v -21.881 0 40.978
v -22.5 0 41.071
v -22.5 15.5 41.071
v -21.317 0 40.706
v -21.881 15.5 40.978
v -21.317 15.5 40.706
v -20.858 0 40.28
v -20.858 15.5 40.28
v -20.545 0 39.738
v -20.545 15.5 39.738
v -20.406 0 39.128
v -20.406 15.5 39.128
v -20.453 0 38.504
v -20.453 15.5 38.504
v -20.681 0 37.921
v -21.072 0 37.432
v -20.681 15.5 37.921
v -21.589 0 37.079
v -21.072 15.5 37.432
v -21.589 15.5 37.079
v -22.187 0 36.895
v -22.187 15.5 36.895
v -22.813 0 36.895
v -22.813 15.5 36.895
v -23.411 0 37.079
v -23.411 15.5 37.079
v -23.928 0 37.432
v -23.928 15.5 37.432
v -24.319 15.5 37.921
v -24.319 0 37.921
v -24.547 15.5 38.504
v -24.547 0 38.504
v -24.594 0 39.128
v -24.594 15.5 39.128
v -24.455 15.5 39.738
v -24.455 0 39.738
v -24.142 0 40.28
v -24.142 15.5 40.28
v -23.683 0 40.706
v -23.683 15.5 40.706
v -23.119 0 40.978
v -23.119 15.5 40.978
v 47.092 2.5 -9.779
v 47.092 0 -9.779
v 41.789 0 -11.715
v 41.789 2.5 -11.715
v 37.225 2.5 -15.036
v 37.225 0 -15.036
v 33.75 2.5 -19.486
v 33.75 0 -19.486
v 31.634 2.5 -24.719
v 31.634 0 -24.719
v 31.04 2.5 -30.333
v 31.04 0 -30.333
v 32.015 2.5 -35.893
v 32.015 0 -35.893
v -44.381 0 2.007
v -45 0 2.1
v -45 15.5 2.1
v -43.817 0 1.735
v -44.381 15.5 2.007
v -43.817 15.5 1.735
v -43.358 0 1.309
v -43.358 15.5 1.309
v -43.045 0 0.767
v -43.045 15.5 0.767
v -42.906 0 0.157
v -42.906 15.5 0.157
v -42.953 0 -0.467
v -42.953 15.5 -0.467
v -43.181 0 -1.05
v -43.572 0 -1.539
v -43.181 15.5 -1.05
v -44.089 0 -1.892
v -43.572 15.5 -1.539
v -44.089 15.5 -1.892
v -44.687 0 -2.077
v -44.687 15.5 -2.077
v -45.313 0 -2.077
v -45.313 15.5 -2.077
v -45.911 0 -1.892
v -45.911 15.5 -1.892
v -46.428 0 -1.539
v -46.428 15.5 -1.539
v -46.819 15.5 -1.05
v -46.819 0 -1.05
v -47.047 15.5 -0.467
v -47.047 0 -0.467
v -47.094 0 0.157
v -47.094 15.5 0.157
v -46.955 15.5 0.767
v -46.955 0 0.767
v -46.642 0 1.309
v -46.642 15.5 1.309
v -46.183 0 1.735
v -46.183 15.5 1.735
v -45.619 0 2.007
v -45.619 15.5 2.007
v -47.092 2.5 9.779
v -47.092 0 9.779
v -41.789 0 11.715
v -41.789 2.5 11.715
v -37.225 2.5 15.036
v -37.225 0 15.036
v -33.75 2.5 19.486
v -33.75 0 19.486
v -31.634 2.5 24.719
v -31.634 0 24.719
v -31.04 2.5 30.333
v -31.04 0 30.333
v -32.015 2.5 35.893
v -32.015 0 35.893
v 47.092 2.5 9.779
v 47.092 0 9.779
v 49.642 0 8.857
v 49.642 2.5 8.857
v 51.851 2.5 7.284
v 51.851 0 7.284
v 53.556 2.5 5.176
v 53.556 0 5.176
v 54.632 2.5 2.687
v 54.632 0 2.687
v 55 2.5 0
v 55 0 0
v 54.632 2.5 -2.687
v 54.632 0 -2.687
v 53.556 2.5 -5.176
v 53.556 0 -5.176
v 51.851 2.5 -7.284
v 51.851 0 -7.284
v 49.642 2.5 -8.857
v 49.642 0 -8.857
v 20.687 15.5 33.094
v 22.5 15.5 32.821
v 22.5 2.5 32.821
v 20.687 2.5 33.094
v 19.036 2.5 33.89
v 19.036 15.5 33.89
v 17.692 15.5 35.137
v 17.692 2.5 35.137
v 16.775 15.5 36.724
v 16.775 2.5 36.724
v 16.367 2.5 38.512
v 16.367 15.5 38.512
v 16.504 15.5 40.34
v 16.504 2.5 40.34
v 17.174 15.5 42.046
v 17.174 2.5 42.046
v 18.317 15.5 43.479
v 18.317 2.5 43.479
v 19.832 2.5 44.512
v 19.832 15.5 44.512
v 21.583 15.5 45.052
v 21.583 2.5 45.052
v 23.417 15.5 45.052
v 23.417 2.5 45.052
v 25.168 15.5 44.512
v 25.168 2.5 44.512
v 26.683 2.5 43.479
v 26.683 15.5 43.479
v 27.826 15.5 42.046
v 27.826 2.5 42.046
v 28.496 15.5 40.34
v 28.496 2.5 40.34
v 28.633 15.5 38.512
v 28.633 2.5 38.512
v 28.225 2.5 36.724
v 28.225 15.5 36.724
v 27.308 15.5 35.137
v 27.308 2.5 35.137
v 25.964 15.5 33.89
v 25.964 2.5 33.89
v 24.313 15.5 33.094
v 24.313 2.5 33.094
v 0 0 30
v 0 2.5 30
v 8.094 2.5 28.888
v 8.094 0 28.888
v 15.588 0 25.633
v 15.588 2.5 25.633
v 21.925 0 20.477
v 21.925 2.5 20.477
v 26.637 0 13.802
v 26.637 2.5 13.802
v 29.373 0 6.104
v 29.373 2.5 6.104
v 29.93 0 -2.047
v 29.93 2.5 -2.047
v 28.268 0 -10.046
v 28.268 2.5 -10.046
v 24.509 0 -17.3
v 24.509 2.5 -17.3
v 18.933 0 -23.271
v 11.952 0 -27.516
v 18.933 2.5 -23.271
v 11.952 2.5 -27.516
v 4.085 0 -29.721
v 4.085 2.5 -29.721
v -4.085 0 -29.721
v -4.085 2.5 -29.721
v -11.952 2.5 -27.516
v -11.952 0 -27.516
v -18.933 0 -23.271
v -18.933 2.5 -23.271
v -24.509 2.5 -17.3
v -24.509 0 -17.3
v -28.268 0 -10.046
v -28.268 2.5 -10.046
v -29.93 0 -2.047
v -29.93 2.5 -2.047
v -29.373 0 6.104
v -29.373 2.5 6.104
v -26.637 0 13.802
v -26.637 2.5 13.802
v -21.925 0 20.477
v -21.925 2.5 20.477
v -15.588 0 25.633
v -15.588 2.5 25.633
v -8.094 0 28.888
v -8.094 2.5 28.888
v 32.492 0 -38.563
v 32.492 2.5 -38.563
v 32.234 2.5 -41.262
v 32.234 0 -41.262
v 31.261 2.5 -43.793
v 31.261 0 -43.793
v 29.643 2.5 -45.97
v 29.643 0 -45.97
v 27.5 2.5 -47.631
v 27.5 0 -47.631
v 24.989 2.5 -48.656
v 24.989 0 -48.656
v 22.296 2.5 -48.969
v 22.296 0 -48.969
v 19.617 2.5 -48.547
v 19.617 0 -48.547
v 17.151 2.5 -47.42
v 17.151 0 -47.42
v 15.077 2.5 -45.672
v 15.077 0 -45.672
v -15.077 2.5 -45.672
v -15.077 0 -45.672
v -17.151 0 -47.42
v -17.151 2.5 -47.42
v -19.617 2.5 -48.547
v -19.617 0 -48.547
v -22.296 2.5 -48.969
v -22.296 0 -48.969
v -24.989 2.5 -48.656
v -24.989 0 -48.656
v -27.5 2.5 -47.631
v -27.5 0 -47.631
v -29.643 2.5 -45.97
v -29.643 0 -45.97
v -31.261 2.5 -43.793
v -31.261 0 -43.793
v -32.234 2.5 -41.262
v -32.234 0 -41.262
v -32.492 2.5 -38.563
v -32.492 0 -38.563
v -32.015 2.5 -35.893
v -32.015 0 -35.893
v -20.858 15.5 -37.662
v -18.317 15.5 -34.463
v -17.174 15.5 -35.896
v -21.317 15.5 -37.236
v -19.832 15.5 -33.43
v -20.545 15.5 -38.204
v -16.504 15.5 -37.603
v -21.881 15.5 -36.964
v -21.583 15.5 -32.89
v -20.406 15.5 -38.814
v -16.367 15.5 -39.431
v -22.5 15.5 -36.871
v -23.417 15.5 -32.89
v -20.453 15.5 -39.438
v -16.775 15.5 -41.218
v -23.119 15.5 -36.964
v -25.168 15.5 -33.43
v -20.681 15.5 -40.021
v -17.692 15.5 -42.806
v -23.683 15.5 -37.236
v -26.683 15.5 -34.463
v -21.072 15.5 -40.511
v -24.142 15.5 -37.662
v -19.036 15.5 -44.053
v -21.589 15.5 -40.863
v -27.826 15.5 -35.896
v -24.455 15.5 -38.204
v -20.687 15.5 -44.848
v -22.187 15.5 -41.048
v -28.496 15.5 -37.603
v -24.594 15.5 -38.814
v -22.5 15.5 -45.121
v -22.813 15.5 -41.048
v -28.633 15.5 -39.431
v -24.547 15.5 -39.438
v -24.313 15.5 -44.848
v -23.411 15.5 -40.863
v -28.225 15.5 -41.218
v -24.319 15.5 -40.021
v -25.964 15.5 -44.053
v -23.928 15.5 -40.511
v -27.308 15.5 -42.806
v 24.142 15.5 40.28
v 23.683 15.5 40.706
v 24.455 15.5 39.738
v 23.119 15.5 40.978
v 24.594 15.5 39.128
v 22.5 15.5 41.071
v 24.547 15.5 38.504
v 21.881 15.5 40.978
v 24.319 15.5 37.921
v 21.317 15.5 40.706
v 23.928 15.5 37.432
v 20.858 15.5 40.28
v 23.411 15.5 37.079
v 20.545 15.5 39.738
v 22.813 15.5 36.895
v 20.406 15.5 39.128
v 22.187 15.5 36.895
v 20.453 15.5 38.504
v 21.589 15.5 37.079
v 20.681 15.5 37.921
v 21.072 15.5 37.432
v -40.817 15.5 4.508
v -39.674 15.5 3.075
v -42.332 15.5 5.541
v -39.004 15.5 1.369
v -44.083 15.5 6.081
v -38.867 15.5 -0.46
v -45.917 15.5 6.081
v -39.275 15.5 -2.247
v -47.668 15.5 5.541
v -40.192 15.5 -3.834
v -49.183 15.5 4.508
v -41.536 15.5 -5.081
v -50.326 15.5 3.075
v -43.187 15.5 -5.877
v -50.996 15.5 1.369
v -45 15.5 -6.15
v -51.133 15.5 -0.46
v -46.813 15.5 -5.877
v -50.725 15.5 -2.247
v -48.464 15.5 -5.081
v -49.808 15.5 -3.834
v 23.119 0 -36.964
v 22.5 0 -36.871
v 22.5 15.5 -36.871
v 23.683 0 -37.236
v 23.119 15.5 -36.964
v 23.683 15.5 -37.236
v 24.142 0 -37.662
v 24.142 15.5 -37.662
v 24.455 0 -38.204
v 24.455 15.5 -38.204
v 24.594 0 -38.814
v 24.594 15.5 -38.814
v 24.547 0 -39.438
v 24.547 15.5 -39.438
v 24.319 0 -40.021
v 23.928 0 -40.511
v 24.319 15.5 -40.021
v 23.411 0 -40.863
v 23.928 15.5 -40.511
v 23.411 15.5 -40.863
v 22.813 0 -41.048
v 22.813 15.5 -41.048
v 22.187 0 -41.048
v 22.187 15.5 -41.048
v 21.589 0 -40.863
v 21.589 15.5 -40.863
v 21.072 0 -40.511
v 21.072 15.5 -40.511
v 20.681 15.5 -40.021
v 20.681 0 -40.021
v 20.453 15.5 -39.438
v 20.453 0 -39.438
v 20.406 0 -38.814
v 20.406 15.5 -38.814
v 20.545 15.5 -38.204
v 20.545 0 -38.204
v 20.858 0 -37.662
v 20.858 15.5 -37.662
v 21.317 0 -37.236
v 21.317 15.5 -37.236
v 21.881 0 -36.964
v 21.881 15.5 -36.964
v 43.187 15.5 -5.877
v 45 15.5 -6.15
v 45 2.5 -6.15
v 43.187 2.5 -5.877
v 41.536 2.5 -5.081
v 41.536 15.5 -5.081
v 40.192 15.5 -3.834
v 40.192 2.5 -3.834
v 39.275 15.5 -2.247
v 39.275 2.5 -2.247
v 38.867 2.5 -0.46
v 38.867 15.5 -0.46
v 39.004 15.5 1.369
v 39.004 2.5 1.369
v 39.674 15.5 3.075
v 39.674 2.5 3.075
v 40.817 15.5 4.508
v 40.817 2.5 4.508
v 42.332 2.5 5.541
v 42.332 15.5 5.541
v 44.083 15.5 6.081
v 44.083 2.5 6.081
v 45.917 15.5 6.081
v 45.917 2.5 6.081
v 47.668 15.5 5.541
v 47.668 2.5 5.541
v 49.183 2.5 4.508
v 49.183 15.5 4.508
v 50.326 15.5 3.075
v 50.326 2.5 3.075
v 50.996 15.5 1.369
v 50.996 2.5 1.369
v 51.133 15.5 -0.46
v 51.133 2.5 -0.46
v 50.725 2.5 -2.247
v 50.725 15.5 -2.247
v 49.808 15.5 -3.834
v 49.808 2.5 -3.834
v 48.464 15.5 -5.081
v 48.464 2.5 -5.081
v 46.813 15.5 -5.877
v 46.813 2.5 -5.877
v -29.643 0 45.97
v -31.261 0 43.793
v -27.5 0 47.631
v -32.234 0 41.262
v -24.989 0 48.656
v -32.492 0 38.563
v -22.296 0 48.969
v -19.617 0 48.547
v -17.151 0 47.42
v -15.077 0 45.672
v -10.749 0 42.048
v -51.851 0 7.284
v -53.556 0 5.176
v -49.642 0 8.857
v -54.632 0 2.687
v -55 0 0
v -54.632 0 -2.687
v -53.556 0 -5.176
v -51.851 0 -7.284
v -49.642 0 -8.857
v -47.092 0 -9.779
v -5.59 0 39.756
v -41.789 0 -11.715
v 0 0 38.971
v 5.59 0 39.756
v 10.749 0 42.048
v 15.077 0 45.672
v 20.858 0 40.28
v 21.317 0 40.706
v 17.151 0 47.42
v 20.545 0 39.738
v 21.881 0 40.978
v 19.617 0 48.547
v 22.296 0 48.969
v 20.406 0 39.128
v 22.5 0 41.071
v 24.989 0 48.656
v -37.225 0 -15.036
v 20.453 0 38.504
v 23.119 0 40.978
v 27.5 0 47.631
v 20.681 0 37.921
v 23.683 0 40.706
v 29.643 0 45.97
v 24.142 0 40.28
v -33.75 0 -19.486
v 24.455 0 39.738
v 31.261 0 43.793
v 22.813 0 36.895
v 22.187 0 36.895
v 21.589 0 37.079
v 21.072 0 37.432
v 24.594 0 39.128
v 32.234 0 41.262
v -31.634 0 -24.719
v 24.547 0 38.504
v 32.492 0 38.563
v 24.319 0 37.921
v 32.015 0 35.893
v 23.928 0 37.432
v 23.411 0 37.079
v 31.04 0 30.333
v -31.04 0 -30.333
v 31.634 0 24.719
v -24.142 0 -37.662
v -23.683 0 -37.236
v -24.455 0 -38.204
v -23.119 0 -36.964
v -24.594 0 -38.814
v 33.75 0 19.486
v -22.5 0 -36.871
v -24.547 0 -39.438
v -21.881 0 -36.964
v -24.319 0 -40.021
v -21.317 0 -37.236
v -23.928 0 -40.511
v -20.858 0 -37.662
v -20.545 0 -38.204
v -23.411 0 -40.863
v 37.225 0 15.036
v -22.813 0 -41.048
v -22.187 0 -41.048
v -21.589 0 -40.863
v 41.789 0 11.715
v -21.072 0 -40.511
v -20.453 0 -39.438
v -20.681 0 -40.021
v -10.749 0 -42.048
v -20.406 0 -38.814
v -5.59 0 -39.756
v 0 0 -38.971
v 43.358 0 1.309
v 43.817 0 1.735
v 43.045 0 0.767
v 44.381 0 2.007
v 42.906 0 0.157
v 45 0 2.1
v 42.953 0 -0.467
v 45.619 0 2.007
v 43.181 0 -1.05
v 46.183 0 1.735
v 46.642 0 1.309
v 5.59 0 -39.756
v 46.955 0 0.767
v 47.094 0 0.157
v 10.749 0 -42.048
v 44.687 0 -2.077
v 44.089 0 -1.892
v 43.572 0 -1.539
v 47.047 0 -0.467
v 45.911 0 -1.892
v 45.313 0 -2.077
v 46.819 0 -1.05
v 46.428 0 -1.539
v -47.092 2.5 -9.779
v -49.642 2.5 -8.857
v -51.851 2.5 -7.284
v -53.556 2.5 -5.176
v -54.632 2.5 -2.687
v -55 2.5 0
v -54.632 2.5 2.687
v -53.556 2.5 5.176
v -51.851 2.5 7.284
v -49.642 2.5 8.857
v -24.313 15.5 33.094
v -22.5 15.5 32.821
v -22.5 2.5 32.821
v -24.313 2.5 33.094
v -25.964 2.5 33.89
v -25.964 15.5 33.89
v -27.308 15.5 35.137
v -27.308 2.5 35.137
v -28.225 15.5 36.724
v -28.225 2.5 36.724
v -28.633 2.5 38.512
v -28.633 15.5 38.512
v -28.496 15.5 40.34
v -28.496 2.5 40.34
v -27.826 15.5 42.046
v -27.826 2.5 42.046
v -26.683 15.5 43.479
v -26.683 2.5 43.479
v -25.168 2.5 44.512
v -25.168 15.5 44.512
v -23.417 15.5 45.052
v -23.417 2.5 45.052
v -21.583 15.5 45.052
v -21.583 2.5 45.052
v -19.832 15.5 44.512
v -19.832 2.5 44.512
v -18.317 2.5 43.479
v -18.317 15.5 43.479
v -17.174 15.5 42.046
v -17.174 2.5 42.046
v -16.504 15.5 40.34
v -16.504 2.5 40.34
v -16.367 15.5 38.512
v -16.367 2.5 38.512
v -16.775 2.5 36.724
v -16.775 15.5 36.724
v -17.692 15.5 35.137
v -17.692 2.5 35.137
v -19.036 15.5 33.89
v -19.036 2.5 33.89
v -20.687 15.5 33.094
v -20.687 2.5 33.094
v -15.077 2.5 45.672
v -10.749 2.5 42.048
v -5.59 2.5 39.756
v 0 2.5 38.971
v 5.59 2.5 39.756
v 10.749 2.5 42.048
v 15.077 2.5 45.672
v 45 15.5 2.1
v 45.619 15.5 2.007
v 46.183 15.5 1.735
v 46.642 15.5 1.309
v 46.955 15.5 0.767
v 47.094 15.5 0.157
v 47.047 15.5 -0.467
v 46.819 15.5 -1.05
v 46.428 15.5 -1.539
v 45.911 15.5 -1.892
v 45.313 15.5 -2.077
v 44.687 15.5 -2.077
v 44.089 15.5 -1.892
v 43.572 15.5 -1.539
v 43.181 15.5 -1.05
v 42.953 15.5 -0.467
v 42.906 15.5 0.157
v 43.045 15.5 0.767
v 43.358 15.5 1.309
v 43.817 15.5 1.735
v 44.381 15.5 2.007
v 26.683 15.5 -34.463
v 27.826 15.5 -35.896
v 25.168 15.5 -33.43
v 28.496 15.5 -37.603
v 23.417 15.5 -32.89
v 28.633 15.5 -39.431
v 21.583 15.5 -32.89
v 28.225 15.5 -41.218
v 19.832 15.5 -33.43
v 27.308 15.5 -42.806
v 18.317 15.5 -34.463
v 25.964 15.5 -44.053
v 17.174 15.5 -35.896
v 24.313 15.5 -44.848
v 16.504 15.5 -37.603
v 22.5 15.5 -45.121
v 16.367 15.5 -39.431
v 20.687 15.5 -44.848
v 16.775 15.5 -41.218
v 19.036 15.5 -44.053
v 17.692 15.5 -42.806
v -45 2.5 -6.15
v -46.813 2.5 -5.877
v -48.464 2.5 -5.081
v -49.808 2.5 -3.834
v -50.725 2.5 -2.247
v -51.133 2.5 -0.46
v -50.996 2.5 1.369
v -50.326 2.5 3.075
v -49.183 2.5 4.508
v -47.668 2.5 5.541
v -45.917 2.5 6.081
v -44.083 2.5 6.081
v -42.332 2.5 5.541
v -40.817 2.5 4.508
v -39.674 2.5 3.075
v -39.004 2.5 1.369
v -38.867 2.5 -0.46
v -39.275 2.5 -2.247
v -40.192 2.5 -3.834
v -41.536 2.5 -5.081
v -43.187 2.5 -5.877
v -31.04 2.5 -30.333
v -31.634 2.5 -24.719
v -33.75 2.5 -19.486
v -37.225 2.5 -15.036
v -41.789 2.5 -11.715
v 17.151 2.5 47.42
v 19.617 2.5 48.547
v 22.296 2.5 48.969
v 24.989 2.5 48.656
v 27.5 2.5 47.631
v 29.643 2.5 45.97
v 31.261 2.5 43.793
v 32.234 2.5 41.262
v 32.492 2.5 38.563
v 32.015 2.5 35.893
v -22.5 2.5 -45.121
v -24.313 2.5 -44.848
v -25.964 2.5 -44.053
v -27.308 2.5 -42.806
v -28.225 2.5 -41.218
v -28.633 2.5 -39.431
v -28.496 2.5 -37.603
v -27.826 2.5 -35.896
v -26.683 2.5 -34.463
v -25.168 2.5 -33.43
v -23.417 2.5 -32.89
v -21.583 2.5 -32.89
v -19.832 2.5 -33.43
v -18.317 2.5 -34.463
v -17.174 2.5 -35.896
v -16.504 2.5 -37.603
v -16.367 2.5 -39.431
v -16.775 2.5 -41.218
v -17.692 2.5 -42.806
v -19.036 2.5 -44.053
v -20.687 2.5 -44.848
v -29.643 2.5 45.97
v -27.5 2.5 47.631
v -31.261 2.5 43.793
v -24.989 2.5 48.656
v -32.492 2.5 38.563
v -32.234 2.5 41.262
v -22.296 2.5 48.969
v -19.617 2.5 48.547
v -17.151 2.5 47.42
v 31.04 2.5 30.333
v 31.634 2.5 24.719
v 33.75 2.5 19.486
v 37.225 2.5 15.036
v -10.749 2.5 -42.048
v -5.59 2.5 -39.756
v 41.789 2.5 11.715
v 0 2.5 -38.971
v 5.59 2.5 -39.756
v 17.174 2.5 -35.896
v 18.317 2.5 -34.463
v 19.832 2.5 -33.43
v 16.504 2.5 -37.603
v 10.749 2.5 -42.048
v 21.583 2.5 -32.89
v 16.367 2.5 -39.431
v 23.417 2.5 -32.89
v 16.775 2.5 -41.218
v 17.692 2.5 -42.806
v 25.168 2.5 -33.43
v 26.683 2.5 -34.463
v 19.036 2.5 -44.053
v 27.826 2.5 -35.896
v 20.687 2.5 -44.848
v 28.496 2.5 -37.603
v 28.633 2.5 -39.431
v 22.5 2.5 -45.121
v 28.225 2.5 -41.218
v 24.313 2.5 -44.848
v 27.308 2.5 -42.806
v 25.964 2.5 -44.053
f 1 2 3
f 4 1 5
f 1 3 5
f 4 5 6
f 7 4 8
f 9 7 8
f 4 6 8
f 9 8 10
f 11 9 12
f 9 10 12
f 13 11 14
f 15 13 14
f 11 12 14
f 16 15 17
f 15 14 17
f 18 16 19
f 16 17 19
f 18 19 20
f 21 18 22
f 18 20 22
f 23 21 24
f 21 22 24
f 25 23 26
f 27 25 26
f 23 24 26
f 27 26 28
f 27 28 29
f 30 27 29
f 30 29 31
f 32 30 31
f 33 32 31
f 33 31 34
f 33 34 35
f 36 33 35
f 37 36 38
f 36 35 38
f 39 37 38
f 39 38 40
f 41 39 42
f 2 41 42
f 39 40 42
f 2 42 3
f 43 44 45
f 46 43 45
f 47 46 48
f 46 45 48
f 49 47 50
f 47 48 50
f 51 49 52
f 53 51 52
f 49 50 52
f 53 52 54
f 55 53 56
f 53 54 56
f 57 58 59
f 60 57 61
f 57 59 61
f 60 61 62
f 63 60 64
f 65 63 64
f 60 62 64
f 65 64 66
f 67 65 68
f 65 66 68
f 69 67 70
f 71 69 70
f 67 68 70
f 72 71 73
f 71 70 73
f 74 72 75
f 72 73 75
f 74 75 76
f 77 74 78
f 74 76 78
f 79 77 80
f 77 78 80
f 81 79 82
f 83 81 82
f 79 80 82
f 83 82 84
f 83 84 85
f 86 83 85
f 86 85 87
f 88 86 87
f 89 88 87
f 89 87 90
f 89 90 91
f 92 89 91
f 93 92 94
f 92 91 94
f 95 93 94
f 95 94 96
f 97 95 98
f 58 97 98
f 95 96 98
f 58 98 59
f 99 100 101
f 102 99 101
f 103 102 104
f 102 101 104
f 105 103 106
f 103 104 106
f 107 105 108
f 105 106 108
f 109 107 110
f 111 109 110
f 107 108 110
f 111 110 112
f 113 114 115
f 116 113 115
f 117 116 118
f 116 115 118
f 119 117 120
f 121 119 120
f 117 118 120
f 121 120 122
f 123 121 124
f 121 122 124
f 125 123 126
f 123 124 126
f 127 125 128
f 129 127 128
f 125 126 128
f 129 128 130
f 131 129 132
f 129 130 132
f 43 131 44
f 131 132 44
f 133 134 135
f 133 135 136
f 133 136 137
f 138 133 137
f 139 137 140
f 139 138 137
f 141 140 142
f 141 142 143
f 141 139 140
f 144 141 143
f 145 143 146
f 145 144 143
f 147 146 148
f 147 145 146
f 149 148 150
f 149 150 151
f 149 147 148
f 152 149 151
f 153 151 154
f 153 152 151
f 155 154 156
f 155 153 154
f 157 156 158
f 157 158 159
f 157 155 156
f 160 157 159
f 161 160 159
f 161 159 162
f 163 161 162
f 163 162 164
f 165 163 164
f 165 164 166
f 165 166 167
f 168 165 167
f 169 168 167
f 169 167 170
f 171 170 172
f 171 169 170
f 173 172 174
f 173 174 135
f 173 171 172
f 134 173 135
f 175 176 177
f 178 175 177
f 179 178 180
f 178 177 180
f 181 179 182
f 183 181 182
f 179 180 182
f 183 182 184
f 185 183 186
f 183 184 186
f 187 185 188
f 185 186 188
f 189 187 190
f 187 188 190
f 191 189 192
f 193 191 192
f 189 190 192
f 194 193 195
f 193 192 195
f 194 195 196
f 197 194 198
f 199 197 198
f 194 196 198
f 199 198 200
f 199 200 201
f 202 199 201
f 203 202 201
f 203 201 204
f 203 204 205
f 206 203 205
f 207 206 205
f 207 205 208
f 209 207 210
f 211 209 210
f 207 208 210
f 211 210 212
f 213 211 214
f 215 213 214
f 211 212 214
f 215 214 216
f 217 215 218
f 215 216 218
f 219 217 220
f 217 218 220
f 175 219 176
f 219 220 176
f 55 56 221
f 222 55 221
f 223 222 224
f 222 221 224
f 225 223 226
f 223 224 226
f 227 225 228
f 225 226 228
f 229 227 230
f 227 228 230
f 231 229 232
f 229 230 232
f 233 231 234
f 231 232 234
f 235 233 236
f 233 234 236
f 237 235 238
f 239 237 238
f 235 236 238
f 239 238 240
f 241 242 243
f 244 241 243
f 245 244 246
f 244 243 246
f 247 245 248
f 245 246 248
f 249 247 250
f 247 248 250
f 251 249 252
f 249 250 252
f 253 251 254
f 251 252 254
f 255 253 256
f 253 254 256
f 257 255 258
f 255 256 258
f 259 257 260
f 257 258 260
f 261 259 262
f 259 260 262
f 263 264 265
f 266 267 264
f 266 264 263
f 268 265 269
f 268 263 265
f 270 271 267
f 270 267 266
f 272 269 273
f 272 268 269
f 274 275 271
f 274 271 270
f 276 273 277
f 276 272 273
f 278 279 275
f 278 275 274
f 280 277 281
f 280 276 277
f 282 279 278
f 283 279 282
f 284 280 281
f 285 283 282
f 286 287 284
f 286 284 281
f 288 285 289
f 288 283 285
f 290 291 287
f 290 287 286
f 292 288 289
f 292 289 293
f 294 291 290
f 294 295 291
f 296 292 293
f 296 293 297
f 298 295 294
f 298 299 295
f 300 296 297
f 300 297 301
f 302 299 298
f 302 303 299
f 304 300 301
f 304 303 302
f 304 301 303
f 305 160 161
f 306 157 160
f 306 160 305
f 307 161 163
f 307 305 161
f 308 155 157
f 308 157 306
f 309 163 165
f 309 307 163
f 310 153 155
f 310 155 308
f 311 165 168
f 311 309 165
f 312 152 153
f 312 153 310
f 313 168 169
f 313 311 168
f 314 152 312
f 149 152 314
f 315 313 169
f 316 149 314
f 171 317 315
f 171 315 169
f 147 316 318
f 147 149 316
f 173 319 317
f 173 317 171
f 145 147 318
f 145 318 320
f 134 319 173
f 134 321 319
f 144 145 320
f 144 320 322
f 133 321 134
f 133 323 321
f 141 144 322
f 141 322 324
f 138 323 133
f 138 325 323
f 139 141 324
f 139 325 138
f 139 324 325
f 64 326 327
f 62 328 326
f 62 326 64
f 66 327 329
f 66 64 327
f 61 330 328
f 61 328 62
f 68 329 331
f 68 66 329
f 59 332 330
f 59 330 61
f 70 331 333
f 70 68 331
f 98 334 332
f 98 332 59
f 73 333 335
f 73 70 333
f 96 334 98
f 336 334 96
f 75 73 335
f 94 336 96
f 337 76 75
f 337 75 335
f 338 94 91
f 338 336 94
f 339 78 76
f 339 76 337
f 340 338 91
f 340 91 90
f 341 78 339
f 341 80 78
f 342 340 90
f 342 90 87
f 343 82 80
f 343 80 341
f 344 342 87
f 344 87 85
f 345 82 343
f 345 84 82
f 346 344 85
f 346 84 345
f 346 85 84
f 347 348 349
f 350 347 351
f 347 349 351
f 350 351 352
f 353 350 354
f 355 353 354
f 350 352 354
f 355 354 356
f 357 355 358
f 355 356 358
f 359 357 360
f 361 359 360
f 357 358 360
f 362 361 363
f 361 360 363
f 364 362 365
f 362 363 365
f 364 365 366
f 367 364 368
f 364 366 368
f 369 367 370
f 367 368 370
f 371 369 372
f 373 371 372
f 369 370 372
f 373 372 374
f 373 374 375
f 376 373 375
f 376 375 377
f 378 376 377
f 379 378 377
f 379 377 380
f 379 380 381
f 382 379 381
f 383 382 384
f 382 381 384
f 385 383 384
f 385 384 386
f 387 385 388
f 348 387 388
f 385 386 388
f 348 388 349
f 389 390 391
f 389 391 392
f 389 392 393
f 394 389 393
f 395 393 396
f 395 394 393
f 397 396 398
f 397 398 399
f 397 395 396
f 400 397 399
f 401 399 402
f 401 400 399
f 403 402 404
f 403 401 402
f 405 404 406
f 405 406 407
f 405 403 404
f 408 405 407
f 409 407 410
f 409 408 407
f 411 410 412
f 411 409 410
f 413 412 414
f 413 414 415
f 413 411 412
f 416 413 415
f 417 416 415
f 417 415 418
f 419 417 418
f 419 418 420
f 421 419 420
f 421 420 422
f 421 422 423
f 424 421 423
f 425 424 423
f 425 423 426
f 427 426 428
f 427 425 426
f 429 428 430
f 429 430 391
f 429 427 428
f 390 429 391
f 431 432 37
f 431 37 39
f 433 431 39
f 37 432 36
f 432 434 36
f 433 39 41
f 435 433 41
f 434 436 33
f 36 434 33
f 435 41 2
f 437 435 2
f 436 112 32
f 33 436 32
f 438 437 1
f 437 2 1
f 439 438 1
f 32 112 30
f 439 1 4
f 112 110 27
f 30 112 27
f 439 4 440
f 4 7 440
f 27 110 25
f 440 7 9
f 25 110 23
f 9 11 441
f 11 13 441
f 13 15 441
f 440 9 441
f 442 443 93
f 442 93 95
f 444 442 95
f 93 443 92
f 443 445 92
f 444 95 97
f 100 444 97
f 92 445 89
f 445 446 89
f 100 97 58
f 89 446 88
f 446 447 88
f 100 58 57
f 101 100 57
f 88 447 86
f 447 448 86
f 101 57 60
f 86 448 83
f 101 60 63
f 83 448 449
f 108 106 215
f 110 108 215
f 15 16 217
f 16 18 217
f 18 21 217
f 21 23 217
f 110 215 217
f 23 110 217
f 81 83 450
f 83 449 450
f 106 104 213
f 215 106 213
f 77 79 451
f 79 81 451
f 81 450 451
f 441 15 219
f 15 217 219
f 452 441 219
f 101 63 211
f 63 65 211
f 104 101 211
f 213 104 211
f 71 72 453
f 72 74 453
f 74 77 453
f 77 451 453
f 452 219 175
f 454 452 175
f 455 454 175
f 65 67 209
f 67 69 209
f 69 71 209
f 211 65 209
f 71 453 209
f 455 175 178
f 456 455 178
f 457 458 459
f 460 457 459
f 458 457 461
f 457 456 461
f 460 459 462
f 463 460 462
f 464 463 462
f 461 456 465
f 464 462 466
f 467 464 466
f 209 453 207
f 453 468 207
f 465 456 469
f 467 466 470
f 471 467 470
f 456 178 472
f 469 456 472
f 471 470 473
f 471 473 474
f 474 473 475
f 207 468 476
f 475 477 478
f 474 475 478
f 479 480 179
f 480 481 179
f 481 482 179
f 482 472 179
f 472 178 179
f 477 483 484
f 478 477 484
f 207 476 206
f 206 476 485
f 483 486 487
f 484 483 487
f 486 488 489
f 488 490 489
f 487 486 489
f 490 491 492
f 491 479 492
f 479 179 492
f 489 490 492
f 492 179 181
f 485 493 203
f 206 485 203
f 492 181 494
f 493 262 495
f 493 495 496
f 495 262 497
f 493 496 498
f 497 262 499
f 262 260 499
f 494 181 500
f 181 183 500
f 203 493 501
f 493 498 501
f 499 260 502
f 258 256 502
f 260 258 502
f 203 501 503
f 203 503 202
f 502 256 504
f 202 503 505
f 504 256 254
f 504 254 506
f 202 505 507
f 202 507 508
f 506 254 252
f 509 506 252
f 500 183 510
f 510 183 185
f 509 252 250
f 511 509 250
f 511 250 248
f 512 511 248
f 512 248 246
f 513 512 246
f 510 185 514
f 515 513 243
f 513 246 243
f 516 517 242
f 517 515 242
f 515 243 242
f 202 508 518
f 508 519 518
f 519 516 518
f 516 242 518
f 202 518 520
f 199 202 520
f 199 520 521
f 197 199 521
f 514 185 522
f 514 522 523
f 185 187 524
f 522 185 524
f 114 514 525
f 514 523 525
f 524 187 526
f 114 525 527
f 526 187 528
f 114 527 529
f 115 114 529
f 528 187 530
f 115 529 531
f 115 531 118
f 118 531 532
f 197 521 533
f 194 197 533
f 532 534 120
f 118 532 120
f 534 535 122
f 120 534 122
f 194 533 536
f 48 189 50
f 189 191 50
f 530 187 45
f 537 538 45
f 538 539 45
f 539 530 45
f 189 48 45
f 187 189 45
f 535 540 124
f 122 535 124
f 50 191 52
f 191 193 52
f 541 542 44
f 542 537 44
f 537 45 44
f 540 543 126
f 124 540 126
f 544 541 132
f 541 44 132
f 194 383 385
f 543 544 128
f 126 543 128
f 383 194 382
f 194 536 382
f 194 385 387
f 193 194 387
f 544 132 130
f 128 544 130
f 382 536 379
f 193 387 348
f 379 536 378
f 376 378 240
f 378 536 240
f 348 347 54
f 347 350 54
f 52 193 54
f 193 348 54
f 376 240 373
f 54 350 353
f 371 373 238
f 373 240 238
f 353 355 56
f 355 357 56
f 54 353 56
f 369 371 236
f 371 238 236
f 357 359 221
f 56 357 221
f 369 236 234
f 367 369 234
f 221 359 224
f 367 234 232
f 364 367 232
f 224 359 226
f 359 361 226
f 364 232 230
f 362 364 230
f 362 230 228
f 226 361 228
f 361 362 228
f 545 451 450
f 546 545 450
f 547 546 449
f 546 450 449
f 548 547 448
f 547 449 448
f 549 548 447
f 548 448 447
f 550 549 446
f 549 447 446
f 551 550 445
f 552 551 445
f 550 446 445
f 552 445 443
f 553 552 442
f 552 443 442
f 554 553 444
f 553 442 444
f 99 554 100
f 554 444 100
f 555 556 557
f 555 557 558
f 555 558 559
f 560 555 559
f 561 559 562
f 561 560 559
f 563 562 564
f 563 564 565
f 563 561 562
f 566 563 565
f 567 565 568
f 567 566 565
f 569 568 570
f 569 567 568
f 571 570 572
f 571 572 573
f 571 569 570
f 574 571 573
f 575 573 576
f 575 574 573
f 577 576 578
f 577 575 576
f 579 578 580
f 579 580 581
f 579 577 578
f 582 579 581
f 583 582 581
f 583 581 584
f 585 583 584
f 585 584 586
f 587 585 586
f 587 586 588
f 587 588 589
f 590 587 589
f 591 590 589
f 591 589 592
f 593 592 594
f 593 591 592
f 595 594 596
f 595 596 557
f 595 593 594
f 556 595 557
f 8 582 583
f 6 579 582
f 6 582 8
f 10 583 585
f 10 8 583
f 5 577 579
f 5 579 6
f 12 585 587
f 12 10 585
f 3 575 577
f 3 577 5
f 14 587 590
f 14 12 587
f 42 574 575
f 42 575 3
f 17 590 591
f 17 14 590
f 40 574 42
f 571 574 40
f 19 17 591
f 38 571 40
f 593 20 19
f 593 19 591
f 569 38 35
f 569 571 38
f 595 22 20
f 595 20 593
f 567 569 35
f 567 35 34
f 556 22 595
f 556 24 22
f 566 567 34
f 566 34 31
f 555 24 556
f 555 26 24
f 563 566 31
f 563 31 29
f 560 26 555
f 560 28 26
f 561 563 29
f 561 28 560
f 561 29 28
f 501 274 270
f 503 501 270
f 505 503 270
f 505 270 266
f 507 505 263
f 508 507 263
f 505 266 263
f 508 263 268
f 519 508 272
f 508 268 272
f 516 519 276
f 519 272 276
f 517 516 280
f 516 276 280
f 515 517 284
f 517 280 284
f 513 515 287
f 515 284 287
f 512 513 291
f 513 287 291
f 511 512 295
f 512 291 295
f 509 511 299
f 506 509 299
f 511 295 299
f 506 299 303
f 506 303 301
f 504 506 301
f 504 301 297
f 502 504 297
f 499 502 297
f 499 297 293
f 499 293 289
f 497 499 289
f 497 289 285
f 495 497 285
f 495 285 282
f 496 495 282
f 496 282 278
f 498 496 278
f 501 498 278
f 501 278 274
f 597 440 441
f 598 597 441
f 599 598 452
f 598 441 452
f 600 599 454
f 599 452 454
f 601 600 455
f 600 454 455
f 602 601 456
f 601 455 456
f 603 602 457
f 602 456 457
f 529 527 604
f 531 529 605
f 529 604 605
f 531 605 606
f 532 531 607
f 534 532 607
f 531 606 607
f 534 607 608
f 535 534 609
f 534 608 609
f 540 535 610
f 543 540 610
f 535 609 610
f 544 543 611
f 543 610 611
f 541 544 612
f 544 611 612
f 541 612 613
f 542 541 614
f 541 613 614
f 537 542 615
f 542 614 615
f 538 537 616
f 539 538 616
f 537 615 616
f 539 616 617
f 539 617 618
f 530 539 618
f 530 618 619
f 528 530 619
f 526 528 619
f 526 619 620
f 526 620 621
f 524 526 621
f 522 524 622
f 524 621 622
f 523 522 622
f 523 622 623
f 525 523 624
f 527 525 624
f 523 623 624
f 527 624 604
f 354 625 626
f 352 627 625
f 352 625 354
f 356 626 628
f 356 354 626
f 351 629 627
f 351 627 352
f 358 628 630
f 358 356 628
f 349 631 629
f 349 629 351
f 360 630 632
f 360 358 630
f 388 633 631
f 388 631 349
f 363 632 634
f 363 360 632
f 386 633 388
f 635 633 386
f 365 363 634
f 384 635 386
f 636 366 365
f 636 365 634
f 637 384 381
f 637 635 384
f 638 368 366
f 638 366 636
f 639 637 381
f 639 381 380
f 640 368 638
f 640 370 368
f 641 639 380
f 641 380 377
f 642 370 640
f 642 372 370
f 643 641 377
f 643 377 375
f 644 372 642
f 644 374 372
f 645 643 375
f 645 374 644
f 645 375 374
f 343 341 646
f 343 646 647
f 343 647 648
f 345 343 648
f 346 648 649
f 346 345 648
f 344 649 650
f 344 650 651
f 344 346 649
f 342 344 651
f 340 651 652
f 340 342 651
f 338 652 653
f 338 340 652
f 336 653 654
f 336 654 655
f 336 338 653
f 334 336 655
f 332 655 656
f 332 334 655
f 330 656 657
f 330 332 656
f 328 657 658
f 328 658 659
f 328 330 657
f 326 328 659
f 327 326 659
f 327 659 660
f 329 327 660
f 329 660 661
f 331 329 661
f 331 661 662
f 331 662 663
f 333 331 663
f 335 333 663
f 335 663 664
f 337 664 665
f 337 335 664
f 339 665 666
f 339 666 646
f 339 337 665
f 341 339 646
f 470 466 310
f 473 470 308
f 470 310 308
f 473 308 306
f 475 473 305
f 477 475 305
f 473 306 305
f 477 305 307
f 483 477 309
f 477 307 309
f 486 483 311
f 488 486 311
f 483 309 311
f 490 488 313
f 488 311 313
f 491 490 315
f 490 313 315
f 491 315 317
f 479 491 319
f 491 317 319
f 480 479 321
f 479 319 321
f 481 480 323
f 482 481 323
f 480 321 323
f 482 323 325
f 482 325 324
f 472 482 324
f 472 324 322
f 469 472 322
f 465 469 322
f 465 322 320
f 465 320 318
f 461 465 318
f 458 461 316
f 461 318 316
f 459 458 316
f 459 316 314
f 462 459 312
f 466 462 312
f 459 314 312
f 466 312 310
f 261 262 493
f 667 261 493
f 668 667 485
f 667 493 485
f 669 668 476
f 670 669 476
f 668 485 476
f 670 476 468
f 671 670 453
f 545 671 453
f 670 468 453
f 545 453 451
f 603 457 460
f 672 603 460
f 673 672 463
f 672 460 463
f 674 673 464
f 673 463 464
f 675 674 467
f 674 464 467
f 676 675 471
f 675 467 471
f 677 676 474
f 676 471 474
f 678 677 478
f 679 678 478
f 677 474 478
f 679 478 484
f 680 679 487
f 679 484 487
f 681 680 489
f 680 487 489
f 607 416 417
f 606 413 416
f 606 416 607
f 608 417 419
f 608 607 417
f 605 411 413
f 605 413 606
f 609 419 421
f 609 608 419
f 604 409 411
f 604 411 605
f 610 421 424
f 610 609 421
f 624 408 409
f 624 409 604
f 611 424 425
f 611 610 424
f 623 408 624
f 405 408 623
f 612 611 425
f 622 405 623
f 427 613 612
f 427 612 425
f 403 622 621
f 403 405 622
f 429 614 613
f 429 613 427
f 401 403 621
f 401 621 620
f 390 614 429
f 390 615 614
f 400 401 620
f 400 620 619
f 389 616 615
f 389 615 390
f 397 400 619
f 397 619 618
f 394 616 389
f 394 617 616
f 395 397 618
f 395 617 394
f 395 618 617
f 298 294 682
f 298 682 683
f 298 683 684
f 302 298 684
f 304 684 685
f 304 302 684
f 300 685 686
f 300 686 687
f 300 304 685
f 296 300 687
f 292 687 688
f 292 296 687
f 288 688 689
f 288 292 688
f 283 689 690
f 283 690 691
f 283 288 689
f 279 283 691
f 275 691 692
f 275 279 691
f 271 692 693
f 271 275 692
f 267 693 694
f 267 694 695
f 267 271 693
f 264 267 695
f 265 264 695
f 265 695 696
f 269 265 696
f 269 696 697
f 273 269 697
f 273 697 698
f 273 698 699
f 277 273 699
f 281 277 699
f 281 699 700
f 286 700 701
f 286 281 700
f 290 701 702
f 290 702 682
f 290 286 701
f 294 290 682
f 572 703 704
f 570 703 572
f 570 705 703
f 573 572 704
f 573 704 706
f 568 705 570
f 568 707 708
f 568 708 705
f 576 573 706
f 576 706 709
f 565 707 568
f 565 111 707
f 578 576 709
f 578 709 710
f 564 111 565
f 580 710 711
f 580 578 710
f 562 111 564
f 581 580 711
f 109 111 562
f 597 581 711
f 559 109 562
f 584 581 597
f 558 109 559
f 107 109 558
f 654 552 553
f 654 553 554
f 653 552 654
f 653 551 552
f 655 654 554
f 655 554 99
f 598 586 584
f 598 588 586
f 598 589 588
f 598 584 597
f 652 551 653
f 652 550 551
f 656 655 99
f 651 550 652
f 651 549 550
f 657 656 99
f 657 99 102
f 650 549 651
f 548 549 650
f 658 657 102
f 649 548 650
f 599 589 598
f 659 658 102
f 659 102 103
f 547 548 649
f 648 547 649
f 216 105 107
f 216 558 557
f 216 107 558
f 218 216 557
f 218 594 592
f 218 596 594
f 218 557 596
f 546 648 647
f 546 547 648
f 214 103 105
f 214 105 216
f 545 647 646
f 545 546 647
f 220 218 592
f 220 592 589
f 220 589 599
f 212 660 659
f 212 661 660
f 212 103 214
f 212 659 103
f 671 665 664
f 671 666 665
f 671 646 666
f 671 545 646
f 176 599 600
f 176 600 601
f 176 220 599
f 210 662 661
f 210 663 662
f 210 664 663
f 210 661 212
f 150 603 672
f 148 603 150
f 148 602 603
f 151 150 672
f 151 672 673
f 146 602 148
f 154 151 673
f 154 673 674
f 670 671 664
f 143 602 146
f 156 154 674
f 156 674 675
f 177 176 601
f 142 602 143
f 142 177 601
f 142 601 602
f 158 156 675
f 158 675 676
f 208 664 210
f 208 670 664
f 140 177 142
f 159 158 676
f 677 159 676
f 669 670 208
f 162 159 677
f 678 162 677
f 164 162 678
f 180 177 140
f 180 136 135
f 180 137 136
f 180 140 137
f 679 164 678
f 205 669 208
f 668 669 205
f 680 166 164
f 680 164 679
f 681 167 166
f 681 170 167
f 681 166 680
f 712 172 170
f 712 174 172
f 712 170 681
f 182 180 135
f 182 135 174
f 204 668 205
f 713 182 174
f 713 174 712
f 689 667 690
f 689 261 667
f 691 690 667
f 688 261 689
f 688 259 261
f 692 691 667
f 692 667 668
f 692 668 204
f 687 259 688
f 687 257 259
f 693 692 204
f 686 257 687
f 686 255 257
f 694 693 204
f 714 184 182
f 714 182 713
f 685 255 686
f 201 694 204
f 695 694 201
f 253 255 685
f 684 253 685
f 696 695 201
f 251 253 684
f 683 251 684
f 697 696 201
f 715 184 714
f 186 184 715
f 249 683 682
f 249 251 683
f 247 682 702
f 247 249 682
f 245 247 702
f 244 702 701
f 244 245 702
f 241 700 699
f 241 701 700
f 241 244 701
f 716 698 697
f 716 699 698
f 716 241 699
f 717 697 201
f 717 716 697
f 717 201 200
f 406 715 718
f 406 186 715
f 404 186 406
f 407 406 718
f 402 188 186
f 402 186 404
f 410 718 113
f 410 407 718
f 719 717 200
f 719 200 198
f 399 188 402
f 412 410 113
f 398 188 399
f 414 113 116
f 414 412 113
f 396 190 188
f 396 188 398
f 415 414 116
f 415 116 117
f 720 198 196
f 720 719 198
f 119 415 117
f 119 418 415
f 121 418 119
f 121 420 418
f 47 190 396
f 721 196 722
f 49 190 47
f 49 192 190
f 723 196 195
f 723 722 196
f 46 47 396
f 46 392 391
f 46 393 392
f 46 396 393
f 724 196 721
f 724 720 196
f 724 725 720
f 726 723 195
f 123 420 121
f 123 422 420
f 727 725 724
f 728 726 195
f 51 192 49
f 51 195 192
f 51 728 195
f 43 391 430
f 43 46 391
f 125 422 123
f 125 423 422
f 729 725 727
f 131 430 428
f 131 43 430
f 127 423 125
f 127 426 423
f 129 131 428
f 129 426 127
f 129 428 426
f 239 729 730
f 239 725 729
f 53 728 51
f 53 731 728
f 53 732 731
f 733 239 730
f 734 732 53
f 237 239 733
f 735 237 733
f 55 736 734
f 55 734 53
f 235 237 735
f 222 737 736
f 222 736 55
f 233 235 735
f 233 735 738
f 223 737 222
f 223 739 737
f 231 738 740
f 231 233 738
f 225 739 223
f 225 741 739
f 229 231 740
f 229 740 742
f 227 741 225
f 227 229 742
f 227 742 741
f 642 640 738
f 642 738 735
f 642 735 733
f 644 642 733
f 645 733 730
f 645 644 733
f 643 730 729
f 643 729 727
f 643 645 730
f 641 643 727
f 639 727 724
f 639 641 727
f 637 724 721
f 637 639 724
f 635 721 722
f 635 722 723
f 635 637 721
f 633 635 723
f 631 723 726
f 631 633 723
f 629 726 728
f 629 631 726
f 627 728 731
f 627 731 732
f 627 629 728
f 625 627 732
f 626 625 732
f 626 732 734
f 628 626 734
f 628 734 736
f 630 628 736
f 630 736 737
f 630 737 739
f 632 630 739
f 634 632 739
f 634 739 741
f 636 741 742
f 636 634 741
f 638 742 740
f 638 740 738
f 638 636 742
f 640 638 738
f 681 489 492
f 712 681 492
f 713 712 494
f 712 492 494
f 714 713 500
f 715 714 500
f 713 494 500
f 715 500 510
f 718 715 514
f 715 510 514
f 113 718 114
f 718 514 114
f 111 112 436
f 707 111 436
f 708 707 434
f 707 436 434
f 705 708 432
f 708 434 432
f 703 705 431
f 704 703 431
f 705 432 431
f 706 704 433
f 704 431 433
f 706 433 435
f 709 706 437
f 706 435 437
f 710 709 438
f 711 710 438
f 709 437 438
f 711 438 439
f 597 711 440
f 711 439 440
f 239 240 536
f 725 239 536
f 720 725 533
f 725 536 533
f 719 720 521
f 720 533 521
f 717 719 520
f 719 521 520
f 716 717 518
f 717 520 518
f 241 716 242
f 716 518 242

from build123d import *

# Parameters (mm, degrees)
EXTRUDE_1_DEPTH     = 2.5
SKETCH_3_R          = 2.1
SKETCH_3_R_2        = 30
CUT_EXTRUDE_1_DEPTH = 2.5
EXTRUDE_START       = 13
SKETCH_4_R          = 6.15
SKETCH_4_R_2        = 2.1
EXTRUDE_2_DEPTH     = 13


with BuildPart() as part:
    # 草图2 → 凸台-拉伸1 (new body)
    with BuildSketch(Plane(origin=(0, 0, 0), x_dir=(1, 0, 0), z_dir=(0, 1, 0))):
        with BuildLine():
            ThreePointArc((32.014603848, -35.893430769), (33.749999498, -19.485572455), (47.091922833, -9.77874526))
            ThreePointArc((47.091922833, -9.77874526), (55, 8.44e-07), (47.091921183, 9.778745613))
            ThreePointArc((47.091921183, 9.778745613), (33.749999557, 19.485572352), (32.014603255, 35.893428936))
            ThreePointArc((32.014603255, 35.893428936), (27.499999447, 47.631397528), (15.077318804, 45.67217323))
            ThreePointArc((15.077318804, 45.67217323), (-6.08e-07, 38.97114317), (-15.077319619, 45.672174133))
            ThreePointArc((-15.077319619, 45.672174133), (-27.500000167, 47.631397112), (-32.014603117, 35.893428511))
            ThreePointArc((-32.014603117, 35.893428511), (-33.750000135, 19.485571351), (-47.091923006, 9.778745223))
            ThreePointArc((-47.091923006, 9.778745223), (-55, 1.241e-06), (-47.091925432, -9.778744704))
            ThreePointArc((-47.091925432, -9.778744704), (-33.7500007, -19.485570372), (-32.014603185, -35.89342872))
            ThreePointArc((-32.014603185, -35.89342872), (-27.500001103, -47.631396571), (-15.077321215, -45.672175901))
            ThreePointArc((-15.077321215, -45.672175901), (-1.245e-06, -38.97114317), (15.077319547, -45.672174053))
            ThreePointArc((15.077319547, -45.672174053), (27.499999092, -47.631397732), (32.014603848, -35.893430769))
        make_face()
    extrude(amount=EXTRUDE_1_DEPTH)

    # 草图3 → 切除-拉伸1 (cut)
    with BuildSketch(Plane(origin=(0, 2.5, 0), x_dir=(1, 0, 0), z_dir=(0, 1, 0))):
        with Locations(Location((-22.5, 38.97114317, 0), (0, 0, 270))):
            Circle(SKETCH_3_R)
        with Locations(Location((22.5, 38.97114317, 0), (0, 0, 270))):
            Circle(SKETCH_3_R)
        with Locations(Location((45, 0, 0), (0, 0, 270))):
            Circle(SKETCH_3_R)
        with Locations(Location((22.5, -38.97114317, 0), (0, 0, 270))):
            Circle(SKETCH_3_R)
        with Locations(Location((-22.5, -38.97114317, 0), (0, 0, 270))):
            Circle(SKETCH_3_R)
        with Locations(Location((-45, 0, 0), (0, 0, 270))):
            Circle(SKETCH_3_R)
        with Locations(Location((0, 0, 0), (0, 0, 270))):
            Circle(SKETCH_3_R_2)
    extrude(amount=-CUT_EXTRUDE_1_DEPTH, mode=Mode.SUBTRACT)

    # 草图4 → 凸台-拉伸2 (add)
    # profile 1 of 6: a face of its own
    with BuildSketch(Plane(origin=(0, 2.5, 0), x_dir=(1, 0, 0), z_dir=(0, 1, 0)).offset(EXTRUDE_START)):
        with Locations(Location((-22.5, 38.97114317, 0), (0, 0, 90))):
            Circle(SKETCH_4_R)
        with Locations(Location((-22.5, 38.97114317, 0), (0, 0, 270))):
            Circle(SKETCH_4_R_2, mode=Mode.SUBTRACT)
    # profile 2 of 6: a face of its own
    with BuildSketch(Plane(origin=(0, 2.5, 0), x_dir=(1, 0, 0), z_dir=(0, 1, 0)).offset(EXTRUDE_START)):
        with Locations(Location((22.5, 38.97114317, 0), (0, 0, 90))):
            Circle(SKETCH_4_R)
        with Locations(Location((22.5, 38.97114317, 0), (0, 0, 270))):
            Circle(SKETCH_4_R_2, mode=Mode.SUBTRACT)
    # profile 3 of 6: a face of its own
    with BuildSketch(Plane(origin=(0, 2.5, 0), x_dir=(1, 0, 0), z_dir=(0, 1, 0)).offset(EXTRUDE_START)):
        with Locations(Location((45, 0, 0), (0, 0, 90))):
            Circle(SKETCH_4_R)
        with Locations(Location((45, 0, 0), (0, 0, 270))):
            Circle(SKETCH_4_R_2, mode=Mode.SUBTRACT)
    # profile 4 of 6: a face of its own
    with BuildSketch(Plane(origin=(0, 2.5, 0), x_dir=(1, 0, 0), z_dir=(0, 1, 0)).offset(EXTRUDE_START)):
        with Locations(Location((22.5, -38.97114317, 0), (0, 0, 90))):
            Circle(SKETCH_4_R)
        with Locations(Location((22.5, -38.97114317, 0), (0, 0, 270))):
            Circle(SKETCH_4_R_2, mode=Mode.SUBTRACT)
    # profile 5 of 6: a face of its own
    with BuildSketch(Plane(origin=(0, 2.5, 0), x_dir=(1, 0, 0), z_dir=(0, 1, 0)).offset(EXTRUDE_START)):
        with Locations(Location((-22.5, -38.97114317, 0), (0, 0, 90))):
            Circle(SKETCH_4_R)
        with Locations(Location((-22.5, -38.97114317, 0), (0, 0, 270))):
            Circle(SKETCH_4_R_2, mode=Mode.SUBTRACT)
    # profile 6 of 6: a face of its own
    with BuildSketch(Plane(origin=(0, 2.5, 0), x_dir=(1, 0, 0), z_dir=(0, 1, 0)).offset(EXTRUDE_START)):
        with Locations(Location((-45, 0, 0), (0, 0, 90))):
            Circle(SKETCH_4_R)
        with Locations(Location((-45, 0, 0), (0, 0, 270))):
            Circle(SKETCH_4_R_2, mode=Mode.SUBTRACT)
    extrude(amount=-EXTRUDE_2_DEPTH)


solid = part.part
